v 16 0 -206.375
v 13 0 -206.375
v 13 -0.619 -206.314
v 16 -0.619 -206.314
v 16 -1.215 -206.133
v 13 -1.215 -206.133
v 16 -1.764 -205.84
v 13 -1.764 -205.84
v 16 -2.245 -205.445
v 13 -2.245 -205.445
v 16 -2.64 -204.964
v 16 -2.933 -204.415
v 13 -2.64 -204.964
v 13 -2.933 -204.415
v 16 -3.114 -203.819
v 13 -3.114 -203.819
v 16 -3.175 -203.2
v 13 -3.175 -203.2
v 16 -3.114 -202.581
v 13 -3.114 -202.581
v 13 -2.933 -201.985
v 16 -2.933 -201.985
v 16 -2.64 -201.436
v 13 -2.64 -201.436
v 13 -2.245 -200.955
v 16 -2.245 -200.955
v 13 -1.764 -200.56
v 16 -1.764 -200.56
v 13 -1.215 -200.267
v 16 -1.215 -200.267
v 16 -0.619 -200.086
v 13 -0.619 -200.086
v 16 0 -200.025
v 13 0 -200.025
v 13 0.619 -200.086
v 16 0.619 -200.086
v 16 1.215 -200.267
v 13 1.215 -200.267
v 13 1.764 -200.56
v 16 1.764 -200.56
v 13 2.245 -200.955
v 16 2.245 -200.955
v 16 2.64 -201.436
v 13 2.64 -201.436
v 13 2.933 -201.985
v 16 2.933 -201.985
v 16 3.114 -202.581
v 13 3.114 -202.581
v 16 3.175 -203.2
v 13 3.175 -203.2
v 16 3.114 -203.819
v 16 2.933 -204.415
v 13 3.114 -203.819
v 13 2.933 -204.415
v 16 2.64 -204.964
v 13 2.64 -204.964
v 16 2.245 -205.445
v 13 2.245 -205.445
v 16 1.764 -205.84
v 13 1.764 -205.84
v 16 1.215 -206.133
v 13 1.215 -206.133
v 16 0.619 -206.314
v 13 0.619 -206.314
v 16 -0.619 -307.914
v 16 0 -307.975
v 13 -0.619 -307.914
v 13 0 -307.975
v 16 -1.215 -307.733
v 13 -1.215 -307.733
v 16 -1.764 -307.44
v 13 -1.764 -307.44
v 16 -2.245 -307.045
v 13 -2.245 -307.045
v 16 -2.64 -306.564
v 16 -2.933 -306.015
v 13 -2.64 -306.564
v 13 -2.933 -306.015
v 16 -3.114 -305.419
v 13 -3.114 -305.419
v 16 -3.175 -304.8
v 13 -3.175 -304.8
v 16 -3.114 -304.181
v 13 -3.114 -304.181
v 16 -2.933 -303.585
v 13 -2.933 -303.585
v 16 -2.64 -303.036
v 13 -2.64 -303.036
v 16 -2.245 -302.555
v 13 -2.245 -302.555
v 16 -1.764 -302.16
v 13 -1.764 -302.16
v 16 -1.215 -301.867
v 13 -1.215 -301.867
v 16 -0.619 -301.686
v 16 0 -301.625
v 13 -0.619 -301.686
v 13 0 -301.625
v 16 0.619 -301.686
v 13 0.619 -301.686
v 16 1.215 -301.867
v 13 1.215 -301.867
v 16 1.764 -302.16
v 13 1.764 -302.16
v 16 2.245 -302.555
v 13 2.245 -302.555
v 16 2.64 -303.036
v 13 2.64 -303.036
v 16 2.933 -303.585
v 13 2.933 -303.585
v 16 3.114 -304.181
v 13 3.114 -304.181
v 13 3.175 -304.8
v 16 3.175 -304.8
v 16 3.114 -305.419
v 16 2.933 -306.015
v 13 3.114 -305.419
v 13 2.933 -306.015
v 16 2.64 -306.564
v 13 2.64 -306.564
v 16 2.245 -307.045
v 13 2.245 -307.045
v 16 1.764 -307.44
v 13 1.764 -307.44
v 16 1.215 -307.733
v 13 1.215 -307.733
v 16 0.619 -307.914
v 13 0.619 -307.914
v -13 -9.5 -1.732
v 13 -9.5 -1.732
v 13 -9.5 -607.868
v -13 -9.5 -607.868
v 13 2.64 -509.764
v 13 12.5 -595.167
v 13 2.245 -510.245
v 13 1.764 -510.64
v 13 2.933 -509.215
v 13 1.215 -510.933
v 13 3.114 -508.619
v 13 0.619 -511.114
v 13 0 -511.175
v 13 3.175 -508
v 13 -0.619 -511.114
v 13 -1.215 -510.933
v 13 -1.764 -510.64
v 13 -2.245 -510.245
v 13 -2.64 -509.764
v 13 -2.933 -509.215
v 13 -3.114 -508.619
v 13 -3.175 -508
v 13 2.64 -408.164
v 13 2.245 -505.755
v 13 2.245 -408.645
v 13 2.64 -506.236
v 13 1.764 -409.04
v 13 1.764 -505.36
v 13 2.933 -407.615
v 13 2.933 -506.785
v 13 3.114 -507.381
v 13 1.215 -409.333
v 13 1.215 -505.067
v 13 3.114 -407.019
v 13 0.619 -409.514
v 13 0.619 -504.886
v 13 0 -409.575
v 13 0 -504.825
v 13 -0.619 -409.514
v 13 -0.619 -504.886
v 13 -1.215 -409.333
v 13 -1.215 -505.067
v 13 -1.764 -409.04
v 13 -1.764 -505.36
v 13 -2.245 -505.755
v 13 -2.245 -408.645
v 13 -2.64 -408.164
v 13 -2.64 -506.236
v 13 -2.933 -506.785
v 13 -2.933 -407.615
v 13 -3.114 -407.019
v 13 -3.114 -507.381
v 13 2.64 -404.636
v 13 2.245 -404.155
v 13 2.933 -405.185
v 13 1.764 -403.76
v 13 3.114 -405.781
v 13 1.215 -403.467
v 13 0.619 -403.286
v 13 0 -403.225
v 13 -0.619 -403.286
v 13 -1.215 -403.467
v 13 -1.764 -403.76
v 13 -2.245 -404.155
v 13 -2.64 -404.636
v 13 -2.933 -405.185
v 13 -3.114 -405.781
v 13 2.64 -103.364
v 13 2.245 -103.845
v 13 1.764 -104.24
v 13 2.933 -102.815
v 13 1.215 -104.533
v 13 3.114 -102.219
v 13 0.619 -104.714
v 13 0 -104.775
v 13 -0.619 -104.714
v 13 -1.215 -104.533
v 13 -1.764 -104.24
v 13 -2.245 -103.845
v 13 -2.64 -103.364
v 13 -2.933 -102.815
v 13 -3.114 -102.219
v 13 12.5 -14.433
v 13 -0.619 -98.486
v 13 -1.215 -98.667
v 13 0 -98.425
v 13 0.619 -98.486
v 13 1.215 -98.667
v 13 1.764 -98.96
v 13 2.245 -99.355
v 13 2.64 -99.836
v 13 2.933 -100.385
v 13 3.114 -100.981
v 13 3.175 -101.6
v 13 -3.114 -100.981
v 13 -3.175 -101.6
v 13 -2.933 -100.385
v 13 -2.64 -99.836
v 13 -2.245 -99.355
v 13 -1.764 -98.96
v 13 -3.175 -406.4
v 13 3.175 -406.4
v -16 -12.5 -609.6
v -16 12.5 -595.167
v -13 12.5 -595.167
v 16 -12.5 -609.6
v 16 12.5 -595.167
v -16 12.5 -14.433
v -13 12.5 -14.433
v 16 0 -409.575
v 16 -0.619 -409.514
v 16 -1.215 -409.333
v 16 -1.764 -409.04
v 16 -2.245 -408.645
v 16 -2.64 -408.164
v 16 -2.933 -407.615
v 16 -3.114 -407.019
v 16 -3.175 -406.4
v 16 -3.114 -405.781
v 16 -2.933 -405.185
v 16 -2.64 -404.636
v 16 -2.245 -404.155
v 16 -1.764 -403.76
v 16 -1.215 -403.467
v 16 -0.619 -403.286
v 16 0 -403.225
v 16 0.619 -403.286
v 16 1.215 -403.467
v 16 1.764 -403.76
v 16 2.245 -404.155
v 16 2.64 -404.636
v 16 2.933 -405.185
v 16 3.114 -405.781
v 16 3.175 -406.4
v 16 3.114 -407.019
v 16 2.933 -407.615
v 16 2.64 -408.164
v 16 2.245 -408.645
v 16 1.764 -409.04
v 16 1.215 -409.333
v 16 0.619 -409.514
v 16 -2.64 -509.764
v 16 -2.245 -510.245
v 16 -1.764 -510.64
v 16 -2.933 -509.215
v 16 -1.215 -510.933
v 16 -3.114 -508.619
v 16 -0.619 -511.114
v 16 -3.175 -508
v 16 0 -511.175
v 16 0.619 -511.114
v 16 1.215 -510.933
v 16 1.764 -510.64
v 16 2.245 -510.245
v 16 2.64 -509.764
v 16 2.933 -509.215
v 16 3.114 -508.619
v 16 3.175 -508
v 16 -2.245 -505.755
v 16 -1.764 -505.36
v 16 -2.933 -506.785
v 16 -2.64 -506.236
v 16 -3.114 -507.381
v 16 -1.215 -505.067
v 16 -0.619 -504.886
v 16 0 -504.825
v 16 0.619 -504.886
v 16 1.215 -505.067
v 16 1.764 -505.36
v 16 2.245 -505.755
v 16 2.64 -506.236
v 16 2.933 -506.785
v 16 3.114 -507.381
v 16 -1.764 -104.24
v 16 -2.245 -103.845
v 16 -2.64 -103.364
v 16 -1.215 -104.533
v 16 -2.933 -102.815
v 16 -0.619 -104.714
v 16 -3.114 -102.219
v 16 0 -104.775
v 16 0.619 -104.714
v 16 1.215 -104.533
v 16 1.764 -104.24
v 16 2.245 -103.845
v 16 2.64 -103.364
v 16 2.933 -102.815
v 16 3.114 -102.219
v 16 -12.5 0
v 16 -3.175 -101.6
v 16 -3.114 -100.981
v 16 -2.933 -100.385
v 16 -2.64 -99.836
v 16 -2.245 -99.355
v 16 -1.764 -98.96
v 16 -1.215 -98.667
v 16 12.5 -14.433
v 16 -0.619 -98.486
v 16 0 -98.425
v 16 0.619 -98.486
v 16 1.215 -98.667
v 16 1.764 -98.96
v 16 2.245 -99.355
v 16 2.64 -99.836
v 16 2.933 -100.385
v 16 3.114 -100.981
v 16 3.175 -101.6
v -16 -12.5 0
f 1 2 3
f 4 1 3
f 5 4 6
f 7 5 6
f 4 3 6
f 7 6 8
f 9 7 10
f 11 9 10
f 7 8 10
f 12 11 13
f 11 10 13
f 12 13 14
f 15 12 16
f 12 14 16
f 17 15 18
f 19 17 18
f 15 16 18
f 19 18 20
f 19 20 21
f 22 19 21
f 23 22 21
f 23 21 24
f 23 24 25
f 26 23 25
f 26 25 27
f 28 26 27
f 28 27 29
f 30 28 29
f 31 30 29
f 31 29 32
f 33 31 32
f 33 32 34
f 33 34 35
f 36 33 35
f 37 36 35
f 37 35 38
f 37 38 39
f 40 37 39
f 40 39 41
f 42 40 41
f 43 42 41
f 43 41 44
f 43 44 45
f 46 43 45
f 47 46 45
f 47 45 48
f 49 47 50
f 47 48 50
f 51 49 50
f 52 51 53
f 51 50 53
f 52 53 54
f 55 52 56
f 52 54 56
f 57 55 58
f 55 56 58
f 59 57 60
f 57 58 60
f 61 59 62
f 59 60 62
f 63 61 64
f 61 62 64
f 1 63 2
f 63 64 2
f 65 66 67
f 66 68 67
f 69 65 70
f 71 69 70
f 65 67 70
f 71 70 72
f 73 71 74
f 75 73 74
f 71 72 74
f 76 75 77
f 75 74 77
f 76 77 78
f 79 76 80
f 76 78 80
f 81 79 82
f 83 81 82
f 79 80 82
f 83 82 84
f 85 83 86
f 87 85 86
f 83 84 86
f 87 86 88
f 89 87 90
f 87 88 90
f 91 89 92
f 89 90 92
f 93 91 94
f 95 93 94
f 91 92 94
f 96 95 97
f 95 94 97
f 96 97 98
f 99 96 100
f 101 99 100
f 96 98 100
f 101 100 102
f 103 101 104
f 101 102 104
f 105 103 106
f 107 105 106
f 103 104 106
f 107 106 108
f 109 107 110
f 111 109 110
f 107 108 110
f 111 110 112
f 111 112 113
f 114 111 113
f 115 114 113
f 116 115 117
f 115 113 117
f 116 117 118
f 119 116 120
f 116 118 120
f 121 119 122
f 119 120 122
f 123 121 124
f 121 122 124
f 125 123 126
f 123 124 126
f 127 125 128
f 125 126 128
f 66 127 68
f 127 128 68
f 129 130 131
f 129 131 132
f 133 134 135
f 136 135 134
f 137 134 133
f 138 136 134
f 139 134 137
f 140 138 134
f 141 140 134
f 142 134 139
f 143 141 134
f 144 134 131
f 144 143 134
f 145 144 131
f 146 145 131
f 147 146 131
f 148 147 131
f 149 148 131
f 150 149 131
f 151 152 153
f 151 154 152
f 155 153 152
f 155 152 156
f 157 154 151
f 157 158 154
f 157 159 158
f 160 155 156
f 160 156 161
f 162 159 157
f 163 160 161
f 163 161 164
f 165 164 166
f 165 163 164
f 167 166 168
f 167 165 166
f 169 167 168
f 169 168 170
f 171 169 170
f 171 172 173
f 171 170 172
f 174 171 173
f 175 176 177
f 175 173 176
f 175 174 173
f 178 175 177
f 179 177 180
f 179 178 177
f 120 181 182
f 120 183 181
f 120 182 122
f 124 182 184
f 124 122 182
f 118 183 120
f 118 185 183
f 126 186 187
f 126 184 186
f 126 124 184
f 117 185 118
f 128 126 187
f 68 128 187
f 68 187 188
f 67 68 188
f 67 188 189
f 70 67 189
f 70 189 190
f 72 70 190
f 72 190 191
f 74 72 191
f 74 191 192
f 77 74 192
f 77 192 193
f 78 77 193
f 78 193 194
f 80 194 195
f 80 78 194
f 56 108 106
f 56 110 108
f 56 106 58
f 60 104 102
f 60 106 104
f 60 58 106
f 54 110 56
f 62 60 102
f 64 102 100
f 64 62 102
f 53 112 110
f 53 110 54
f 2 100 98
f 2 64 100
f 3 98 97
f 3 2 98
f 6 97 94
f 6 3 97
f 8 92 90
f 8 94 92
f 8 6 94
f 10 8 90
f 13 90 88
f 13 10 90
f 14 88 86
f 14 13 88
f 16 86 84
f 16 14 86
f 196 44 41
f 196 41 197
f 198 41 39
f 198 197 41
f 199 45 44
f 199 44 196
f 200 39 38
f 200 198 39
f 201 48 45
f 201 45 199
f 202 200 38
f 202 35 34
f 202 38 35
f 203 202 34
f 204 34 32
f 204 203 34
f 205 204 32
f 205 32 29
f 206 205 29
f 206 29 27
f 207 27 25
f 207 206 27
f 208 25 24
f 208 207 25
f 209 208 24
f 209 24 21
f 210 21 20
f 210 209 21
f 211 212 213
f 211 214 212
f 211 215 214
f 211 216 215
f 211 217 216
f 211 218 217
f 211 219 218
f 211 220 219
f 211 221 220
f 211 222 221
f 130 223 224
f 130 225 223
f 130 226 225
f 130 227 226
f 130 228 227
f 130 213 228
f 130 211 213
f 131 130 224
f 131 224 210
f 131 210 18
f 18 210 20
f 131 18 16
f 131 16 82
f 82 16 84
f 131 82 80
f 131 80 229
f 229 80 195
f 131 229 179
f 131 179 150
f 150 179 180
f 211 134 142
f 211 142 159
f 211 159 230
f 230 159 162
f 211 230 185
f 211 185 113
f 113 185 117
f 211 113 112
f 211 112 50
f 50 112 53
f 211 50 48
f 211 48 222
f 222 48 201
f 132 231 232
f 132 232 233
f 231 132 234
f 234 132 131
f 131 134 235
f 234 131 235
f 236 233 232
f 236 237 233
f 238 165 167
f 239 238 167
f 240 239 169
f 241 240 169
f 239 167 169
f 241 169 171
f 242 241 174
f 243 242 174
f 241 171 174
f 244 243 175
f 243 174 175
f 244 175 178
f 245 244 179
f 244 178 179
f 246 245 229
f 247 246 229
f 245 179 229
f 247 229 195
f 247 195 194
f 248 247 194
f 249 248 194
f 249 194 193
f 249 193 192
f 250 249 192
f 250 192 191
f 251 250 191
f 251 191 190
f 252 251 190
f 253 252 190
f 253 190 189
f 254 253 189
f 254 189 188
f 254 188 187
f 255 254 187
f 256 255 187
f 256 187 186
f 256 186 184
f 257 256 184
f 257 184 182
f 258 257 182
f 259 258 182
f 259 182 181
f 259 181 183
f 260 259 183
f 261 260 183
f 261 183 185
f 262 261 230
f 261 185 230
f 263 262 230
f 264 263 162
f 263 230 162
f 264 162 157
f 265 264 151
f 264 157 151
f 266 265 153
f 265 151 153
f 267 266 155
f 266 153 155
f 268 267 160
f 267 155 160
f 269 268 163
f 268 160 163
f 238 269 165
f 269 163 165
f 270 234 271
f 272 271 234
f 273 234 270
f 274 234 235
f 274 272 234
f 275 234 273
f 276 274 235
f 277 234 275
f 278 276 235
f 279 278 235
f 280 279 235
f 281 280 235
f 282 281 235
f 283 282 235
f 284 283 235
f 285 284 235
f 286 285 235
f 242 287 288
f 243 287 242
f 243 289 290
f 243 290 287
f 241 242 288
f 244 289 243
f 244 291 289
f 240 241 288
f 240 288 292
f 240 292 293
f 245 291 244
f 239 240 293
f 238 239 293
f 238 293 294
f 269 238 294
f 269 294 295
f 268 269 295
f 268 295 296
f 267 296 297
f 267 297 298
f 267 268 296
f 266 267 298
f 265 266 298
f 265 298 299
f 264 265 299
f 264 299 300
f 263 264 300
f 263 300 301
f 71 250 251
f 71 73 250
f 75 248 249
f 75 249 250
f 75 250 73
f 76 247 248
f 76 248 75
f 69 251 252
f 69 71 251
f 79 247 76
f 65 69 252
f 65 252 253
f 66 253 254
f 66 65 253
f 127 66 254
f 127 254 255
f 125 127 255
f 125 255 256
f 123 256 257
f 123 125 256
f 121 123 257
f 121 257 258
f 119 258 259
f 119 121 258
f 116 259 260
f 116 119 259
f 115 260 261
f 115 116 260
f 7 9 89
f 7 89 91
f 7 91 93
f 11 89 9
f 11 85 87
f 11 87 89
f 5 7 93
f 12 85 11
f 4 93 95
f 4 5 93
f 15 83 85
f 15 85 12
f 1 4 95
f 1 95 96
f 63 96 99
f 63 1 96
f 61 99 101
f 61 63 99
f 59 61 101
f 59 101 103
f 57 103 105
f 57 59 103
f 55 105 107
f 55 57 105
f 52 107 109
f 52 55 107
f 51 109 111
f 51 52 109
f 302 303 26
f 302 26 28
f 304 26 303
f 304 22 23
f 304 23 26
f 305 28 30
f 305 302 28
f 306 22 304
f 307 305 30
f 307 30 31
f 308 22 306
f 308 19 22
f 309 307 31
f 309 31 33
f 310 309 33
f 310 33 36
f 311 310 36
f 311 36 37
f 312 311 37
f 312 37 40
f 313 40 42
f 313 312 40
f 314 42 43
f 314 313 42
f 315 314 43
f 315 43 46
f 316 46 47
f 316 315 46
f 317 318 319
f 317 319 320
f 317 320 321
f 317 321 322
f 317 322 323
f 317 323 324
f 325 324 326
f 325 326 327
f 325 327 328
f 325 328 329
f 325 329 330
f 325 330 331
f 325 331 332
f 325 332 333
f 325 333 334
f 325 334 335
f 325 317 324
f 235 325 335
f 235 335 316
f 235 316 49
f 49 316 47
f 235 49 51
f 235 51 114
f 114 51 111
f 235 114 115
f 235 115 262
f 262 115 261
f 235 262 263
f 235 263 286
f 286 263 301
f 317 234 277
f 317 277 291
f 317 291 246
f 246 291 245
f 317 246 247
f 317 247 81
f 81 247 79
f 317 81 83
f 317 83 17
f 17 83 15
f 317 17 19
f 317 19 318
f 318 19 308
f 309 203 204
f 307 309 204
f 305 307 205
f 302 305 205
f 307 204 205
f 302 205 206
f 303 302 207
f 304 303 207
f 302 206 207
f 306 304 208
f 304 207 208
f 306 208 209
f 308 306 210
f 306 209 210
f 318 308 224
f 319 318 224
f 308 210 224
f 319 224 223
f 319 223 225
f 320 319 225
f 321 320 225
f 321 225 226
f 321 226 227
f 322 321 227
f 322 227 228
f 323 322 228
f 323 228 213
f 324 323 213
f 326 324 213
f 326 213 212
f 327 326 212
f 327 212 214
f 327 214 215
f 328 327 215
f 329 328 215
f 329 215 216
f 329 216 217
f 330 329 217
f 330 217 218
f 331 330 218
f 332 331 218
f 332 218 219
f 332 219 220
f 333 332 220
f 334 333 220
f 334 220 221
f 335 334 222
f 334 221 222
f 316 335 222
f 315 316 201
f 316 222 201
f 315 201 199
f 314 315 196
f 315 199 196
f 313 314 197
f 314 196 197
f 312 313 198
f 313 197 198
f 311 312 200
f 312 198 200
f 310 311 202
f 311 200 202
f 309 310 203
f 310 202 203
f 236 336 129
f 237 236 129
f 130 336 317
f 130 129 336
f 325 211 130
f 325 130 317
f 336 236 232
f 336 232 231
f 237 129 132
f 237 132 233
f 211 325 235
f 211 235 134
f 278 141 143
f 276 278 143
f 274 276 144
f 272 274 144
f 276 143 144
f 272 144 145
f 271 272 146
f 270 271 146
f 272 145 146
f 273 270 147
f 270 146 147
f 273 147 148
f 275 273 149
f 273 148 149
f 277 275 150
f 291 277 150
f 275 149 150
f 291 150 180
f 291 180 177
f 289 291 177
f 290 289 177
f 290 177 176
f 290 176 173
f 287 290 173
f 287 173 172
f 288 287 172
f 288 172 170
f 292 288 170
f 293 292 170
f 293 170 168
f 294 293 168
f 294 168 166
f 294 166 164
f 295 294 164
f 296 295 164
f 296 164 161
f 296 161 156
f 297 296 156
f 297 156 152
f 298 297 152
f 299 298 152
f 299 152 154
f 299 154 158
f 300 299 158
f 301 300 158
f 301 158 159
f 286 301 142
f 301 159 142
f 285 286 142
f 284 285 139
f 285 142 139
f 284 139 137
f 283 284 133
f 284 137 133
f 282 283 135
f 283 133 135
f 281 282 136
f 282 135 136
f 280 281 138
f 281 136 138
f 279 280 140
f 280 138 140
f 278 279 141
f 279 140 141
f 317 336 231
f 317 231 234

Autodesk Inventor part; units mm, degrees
ref_plane "YZ Plane" through (0, 0, 0) normal (1, 0, 0) x (0, 1, 0)
ref_plane "XZ Plane" through (0, 0, 0) normal (0, 1, 0) x (-1, 0, 0)
ref_plane "XY Plane" through (0, 0, 0) normal (0, 0, 1) x (1, 0, 0)
sketch "Sketch1" plane through (0, 0, 0) normal (0, 0, 1) x (1, 0, 0)
  line L0 (-16, -12.5) -> (16, -12.5)
  line L1 (16, -12.5) -> (16, 12.5)
  line L2 (16, 12.5) -> (13, 12.5)
  line L3 (13, 12.5) -> (13, -9.5)
  line L4 (13, -9.5) -> (-13, -9.5)
  line L5 (-13, -9.5) -> (-13, 12.5)
  line L6 (-13, 12.5) -> (-16, 12.5)
  line L7 (-16, 12.5) -> (-16, -12.5)
  point P0 (0, 0)
  dimension "d0" = 32
  dimension "d1" = 25
  dimension "d2" = 3
  dimension "d3" = 90
  dimension "d4" = 22
  dimension "d5" = 26
  dimension "d6" = 22
  dimension "d7" = 3
  dimension "d8" = 25
  dimension "d10" = 12.5
  dimension "d11" = 16
extrude "Extrusion1" add sketch "Sketch1" against normal blind 609.6
chamfer "Chamfer1" distance 25 angle 30 1 edges at (14.5, 12.5, 0) measured on face at (4.3333, -11.5, 0)
chamfer "Chamfer2" distance 25 angle 30 1 edges at (14.5, 12.5, -609.6) measured on face at (4.3333, -11.5, -609.6)
sketch "Sketch2" plane through (16, -12.5, 0) normal (1, 0, 0) x (0, 0, -1)
  line L0 (595.1662, 25) -> (609.6, 0) projected
  line L1 (14.4338, 25) -> (595.1662, 25) projected
  line L2 (602.3831, 12.5) -> (599.0481, 12.5)
  line L3 (508, 12.5) -> (101.6, 12.5) construction
  line L4 (101.6, 12.5) -> (203.2, 12.5) construction
  line L5 (203.2, 12.5) -> (304.8, 12.5) construction
  line L6 (304.8, 12.5) -> (406.4, 12.5) construction
  line L7 (406.4, 12.5) -> (508, 12.5) construction
  circle A0 centre (101.6, 12.5) radius 3.175
  circle A1 centre (203.2, 12.5) radius 3.175
  circle A2 centre (304.8, 12.5) radius 3.175
  circle A3 centre (406.4, 12.5) radius 3.175
  circle A4 centre (508, 12.5) radius 3.175
  line L8 (0, 12.5) -> (609.6, 12.5) construction
  point P0 (0, 0)
  dimension "d21" = 3.335
  dimension "d23" = 406.4
  dimension "d24" = 101.6
  dimension "d25" = 101.6
  dimension "d26" = 101.6
  dimension "d28" = 6.35
  dimension "d29" = 6.35
  dimension "d30" = 6.35
  dimension "d31" = 6.35
  dimension "d32" = 6.35
  dimension "d35" = 101.6
  dimension "d36" = 609.6
  dimension "d37" = 101.6
  dimension "d38" = 101.6
hole "Mounting Holes" at (16, 0, -101.6) at (16, 0, -203.2) at (16, 0, -304.8) at (16, 0, -406.4) at (16, 0, -508) direction (-1, 0, 0) diameter 6.35 depth 8 tip angle 118
equation "\"d5\" = d0 - 2 * d2"
equation "\"d10\" = 0.5 * d1"
equation "\"d11\" = 0.5 * d0"
equation "\"d24\" = d35"
equation "\"d25\" = d24"
equation "\"d26\" = d24"
equation "\"d29\" = d28"
equation "\"d30\" = d28"
equation "\"d31\" = d28"
equation "\"d32\" = d28"
equation "\"d35\" = 0.166667 * d36"
equation "\"d37\" = d35"
properties part number "24in C-Channel"
